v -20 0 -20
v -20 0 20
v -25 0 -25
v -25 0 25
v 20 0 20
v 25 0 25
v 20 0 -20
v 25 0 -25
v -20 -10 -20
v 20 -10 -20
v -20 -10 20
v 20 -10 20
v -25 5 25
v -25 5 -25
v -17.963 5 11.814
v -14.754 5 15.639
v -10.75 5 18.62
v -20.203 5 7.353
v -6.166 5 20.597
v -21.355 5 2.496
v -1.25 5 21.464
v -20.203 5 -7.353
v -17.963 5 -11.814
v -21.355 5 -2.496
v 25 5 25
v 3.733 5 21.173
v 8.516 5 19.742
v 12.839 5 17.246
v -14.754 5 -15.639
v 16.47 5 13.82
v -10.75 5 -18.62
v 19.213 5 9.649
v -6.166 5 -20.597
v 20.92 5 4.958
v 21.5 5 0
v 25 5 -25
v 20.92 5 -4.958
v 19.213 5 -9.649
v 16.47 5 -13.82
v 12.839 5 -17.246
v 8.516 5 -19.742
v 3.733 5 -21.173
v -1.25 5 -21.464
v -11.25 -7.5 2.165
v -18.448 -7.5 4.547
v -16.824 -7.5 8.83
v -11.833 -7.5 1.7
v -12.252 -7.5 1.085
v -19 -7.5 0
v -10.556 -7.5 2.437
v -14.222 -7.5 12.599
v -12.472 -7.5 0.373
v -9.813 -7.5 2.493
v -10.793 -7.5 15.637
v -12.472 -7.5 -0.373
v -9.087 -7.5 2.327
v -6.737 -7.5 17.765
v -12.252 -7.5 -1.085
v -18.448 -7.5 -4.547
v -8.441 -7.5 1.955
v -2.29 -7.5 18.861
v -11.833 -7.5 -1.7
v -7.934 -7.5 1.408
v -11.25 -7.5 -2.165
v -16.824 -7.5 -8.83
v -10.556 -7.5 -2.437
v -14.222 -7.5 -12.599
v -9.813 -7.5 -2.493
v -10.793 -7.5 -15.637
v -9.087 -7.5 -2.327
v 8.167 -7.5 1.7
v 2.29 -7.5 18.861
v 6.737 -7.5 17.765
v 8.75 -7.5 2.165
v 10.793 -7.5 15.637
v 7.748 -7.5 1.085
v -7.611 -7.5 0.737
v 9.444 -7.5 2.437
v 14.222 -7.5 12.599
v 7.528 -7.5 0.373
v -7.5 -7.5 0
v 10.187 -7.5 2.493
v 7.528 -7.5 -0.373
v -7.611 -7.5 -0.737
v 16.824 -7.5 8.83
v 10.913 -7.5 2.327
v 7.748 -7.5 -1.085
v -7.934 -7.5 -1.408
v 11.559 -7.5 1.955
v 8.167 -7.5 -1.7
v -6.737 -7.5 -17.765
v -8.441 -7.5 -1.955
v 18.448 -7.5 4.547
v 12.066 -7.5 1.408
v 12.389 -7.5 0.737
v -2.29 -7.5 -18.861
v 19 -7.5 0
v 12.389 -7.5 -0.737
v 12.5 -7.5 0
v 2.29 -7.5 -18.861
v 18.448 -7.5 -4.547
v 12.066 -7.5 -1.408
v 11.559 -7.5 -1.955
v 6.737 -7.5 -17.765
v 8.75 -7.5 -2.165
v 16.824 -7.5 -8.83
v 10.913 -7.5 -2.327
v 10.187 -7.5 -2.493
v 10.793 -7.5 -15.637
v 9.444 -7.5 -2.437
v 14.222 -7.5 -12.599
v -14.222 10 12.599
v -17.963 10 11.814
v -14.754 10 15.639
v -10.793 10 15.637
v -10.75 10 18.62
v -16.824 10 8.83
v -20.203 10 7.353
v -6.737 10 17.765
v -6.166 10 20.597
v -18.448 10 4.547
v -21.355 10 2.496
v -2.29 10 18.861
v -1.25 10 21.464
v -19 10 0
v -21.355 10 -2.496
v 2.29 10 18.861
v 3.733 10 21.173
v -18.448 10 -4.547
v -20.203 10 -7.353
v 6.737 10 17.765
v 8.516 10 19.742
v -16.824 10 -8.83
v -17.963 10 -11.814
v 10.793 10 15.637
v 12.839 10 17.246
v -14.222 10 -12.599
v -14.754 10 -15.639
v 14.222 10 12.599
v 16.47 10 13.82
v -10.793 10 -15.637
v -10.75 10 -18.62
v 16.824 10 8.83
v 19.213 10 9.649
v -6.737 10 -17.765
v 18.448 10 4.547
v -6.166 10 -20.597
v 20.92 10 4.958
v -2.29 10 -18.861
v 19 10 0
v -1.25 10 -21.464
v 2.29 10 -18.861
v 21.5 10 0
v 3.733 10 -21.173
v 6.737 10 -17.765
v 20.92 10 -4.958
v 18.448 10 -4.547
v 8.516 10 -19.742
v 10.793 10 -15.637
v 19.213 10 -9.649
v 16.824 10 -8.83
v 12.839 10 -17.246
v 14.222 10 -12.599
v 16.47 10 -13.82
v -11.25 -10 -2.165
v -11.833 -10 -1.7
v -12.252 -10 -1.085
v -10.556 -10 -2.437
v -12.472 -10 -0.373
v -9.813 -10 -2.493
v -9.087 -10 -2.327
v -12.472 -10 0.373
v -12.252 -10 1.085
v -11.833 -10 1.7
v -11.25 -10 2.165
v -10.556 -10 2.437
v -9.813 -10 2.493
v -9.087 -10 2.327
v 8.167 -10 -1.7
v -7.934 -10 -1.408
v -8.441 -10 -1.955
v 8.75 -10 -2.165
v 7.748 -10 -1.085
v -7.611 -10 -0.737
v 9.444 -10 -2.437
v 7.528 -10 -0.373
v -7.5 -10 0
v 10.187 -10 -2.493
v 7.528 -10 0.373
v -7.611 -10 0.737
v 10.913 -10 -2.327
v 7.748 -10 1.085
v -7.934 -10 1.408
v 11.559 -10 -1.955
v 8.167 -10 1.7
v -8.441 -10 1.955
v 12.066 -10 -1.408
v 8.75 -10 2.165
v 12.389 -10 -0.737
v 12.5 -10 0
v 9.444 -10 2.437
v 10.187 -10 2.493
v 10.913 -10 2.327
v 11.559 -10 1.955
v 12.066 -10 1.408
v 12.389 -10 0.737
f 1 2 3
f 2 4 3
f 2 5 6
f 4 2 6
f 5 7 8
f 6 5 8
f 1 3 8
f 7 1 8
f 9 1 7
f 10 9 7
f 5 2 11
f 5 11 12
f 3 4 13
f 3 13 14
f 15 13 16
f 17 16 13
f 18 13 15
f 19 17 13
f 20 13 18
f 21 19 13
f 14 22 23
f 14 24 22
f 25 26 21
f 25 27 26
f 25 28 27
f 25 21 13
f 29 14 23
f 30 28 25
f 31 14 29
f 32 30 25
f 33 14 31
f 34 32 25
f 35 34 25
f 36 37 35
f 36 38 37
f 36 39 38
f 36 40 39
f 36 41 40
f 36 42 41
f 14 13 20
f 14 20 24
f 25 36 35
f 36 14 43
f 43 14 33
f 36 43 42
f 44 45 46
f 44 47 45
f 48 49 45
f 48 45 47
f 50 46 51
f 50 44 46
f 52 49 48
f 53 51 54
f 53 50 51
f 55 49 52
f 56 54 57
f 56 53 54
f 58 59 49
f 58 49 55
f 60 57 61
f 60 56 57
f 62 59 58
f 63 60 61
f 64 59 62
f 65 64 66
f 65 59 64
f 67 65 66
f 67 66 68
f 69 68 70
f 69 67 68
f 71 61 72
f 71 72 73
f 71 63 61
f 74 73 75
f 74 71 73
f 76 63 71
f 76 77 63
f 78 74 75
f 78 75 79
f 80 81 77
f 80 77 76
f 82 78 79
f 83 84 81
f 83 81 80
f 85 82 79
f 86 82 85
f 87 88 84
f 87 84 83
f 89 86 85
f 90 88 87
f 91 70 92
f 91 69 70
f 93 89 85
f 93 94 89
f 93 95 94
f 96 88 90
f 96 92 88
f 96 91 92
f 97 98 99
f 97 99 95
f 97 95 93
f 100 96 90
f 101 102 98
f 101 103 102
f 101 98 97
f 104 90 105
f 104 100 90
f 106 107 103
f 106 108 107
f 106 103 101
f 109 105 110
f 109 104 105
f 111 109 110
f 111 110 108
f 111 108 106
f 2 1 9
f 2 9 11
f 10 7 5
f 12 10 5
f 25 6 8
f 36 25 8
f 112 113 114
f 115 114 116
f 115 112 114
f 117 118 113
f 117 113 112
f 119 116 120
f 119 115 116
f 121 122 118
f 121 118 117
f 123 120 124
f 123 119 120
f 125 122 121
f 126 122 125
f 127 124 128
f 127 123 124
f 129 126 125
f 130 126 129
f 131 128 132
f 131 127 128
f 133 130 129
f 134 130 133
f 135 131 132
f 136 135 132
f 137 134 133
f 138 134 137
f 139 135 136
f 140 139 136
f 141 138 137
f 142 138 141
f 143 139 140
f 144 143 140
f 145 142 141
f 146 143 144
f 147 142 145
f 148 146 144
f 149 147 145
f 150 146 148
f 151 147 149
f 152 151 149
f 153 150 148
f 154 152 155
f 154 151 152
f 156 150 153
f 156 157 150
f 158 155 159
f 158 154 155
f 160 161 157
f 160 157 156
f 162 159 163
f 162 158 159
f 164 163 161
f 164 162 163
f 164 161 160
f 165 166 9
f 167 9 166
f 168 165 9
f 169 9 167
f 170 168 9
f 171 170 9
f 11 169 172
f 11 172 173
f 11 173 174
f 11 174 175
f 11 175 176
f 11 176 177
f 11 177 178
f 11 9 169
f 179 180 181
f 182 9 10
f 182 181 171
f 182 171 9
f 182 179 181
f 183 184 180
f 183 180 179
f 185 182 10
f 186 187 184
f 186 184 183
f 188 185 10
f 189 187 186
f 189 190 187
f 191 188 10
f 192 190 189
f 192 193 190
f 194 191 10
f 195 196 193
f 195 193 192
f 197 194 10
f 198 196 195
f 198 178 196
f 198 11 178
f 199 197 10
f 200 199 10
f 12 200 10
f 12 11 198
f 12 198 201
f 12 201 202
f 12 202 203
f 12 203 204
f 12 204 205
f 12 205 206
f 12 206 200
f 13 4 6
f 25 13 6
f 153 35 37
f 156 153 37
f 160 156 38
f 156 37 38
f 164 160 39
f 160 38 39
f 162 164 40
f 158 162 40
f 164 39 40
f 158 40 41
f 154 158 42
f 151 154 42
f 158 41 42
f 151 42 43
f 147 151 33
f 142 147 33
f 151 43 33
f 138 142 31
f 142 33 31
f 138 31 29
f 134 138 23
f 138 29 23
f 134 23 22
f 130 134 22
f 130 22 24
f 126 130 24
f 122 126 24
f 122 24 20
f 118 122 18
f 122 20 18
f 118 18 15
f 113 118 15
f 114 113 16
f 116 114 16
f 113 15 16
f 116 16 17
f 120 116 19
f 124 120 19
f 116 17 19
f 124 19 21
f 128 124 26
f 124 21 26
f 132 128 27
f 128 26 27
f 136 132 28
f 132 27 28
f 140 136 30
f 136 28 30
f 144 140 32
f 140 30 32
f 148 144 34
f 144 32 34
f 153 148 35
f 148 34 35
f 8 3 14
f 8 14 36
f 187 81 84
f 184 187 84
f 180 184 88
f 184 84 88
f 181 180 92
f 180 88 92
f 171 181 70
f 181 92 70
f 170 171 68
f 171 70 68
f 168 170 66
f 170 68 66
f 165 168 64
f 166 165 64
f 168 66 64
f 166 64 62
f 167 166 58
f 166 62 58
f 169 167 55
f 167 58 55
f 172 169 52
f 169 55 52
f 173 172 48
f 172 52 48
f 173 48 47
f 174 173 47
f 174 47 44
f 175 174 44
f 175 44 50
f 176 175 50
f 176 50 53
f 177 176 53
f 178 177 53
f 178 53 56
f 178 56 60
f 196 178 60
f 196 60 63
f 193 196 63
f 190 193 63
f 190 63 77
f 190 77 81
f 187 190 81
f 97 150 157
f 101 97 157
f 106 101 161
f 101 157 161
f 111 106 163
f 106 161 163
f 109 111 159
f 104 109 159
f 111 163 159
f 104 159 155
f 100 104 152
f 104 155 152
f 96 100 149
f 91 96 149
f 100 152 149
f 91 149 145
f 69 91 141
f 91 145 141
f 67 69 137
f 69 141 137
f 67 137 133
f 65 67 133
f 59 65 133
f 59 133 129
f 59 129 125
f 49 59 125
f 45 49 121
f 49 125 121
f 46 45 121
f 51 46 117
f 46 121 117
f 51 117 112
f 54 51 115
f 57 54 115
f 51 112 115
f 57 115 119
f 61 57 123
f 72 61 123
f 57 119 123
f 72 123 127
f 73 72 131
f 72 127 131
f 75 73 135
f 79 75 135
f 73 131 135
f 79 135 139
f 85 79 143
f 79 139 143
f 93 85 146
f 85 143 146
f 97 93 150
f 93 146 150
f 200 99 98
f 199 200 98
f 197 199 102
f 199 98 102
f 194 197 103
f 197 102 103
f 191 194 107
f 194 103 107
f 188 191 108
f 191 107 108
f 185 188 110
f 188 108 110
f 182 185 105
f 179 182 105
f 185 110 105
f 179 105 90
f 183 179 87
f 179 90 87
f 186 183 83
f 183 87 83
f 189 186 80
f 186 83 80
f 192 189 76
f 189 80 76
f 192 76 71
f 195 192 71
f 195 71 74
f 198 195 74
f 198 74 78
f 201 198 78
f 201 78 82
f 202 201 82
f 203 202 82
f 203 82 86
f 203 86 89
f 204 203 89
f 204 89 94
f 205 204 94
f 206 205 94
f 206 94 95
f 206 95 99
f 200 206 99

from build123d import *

# Parameters (mm, degrees)
CROQUIS1_W              = 50
CROQUIS1_H              = 50
SALIENTE_EXTRUIR1_DEPTH = 5
CROQUIS2_R              = 21.5
SALIENTE_EXTRUIR2_DEPTH = 5
CROQUIS4_W              = 40
CROQUIS4_H              = 40
SALIENTE_EXTRUIR3_DEPTH = 10
CROQUIS3_R              = 19
CORTAR_EXTRUIR1_DEPTH   = 17.5
CROQUIS5_R              = 2.5
CORTAR_EXTRUIR2_DEPTH   = 3.5


with BuildPart() as part:
    # Croquis1 → Saliente-Extruir1 (new body)
    with BuildSketch(Plane(origin=(0, 0, 0), x_dir=(1, 0, 0), z_dir=(0, 1, 0))):
        Rectangle(CROQUIS1_W, CROQUIS1_H)
    extrude(amount=SALIENTE_EXTRUIR1_DEPTH)

    # Croquis2 → Saliente-Extruir2 (add)
    with BuildSketch(Plane(origin=(0, 5, 0), x_dir=(1, 0, 0), z_dir=(0, 1, 0))):
        Circle(CROQUIS2_R)
    extrude(amount=SALIENTE_EXTRUIR2_DEPTH)

    # Croquis4 → Saliente-Extruir3 (add)
    with BuildSketch(Plane.XZ):
        Rectangle(CROQUIS4_W, CROQUIS4_H)
    extrude(amount=SALIENTE_EXTRUIR3_DEPTH)

    # Croquis3 → Cortar-Extruir1 (cut)
    with BuildSketch(Plane(origin=(0, 10, 0), x_dir=(1, 0, 0), z_dir=(0, 1, 0))):
        Circle(CROQUIS3_R)
    extrude(amount=-CORTAR_EXTRUIR1_DEPTH, mode=Mode.SUBTRACT)

    # Croquis5 → Cortar-Extruir2 (cut, through all)
    with BuildSketch(Plane(origin=(0, -7.5, 0), x_dir=(1, 0, 0), z_dir=(0, 1, 0))):
        with Locations((10, 0)):
            Circle(CROQUIS5_R)
        with Locations((-10, 0)):
            Circle(CROQUIS5_R)
    extrude(amount=-CORTAR_EXTRUIR2_DEPTH, mode=Mode.SUBTRACT)


solid = part.part
